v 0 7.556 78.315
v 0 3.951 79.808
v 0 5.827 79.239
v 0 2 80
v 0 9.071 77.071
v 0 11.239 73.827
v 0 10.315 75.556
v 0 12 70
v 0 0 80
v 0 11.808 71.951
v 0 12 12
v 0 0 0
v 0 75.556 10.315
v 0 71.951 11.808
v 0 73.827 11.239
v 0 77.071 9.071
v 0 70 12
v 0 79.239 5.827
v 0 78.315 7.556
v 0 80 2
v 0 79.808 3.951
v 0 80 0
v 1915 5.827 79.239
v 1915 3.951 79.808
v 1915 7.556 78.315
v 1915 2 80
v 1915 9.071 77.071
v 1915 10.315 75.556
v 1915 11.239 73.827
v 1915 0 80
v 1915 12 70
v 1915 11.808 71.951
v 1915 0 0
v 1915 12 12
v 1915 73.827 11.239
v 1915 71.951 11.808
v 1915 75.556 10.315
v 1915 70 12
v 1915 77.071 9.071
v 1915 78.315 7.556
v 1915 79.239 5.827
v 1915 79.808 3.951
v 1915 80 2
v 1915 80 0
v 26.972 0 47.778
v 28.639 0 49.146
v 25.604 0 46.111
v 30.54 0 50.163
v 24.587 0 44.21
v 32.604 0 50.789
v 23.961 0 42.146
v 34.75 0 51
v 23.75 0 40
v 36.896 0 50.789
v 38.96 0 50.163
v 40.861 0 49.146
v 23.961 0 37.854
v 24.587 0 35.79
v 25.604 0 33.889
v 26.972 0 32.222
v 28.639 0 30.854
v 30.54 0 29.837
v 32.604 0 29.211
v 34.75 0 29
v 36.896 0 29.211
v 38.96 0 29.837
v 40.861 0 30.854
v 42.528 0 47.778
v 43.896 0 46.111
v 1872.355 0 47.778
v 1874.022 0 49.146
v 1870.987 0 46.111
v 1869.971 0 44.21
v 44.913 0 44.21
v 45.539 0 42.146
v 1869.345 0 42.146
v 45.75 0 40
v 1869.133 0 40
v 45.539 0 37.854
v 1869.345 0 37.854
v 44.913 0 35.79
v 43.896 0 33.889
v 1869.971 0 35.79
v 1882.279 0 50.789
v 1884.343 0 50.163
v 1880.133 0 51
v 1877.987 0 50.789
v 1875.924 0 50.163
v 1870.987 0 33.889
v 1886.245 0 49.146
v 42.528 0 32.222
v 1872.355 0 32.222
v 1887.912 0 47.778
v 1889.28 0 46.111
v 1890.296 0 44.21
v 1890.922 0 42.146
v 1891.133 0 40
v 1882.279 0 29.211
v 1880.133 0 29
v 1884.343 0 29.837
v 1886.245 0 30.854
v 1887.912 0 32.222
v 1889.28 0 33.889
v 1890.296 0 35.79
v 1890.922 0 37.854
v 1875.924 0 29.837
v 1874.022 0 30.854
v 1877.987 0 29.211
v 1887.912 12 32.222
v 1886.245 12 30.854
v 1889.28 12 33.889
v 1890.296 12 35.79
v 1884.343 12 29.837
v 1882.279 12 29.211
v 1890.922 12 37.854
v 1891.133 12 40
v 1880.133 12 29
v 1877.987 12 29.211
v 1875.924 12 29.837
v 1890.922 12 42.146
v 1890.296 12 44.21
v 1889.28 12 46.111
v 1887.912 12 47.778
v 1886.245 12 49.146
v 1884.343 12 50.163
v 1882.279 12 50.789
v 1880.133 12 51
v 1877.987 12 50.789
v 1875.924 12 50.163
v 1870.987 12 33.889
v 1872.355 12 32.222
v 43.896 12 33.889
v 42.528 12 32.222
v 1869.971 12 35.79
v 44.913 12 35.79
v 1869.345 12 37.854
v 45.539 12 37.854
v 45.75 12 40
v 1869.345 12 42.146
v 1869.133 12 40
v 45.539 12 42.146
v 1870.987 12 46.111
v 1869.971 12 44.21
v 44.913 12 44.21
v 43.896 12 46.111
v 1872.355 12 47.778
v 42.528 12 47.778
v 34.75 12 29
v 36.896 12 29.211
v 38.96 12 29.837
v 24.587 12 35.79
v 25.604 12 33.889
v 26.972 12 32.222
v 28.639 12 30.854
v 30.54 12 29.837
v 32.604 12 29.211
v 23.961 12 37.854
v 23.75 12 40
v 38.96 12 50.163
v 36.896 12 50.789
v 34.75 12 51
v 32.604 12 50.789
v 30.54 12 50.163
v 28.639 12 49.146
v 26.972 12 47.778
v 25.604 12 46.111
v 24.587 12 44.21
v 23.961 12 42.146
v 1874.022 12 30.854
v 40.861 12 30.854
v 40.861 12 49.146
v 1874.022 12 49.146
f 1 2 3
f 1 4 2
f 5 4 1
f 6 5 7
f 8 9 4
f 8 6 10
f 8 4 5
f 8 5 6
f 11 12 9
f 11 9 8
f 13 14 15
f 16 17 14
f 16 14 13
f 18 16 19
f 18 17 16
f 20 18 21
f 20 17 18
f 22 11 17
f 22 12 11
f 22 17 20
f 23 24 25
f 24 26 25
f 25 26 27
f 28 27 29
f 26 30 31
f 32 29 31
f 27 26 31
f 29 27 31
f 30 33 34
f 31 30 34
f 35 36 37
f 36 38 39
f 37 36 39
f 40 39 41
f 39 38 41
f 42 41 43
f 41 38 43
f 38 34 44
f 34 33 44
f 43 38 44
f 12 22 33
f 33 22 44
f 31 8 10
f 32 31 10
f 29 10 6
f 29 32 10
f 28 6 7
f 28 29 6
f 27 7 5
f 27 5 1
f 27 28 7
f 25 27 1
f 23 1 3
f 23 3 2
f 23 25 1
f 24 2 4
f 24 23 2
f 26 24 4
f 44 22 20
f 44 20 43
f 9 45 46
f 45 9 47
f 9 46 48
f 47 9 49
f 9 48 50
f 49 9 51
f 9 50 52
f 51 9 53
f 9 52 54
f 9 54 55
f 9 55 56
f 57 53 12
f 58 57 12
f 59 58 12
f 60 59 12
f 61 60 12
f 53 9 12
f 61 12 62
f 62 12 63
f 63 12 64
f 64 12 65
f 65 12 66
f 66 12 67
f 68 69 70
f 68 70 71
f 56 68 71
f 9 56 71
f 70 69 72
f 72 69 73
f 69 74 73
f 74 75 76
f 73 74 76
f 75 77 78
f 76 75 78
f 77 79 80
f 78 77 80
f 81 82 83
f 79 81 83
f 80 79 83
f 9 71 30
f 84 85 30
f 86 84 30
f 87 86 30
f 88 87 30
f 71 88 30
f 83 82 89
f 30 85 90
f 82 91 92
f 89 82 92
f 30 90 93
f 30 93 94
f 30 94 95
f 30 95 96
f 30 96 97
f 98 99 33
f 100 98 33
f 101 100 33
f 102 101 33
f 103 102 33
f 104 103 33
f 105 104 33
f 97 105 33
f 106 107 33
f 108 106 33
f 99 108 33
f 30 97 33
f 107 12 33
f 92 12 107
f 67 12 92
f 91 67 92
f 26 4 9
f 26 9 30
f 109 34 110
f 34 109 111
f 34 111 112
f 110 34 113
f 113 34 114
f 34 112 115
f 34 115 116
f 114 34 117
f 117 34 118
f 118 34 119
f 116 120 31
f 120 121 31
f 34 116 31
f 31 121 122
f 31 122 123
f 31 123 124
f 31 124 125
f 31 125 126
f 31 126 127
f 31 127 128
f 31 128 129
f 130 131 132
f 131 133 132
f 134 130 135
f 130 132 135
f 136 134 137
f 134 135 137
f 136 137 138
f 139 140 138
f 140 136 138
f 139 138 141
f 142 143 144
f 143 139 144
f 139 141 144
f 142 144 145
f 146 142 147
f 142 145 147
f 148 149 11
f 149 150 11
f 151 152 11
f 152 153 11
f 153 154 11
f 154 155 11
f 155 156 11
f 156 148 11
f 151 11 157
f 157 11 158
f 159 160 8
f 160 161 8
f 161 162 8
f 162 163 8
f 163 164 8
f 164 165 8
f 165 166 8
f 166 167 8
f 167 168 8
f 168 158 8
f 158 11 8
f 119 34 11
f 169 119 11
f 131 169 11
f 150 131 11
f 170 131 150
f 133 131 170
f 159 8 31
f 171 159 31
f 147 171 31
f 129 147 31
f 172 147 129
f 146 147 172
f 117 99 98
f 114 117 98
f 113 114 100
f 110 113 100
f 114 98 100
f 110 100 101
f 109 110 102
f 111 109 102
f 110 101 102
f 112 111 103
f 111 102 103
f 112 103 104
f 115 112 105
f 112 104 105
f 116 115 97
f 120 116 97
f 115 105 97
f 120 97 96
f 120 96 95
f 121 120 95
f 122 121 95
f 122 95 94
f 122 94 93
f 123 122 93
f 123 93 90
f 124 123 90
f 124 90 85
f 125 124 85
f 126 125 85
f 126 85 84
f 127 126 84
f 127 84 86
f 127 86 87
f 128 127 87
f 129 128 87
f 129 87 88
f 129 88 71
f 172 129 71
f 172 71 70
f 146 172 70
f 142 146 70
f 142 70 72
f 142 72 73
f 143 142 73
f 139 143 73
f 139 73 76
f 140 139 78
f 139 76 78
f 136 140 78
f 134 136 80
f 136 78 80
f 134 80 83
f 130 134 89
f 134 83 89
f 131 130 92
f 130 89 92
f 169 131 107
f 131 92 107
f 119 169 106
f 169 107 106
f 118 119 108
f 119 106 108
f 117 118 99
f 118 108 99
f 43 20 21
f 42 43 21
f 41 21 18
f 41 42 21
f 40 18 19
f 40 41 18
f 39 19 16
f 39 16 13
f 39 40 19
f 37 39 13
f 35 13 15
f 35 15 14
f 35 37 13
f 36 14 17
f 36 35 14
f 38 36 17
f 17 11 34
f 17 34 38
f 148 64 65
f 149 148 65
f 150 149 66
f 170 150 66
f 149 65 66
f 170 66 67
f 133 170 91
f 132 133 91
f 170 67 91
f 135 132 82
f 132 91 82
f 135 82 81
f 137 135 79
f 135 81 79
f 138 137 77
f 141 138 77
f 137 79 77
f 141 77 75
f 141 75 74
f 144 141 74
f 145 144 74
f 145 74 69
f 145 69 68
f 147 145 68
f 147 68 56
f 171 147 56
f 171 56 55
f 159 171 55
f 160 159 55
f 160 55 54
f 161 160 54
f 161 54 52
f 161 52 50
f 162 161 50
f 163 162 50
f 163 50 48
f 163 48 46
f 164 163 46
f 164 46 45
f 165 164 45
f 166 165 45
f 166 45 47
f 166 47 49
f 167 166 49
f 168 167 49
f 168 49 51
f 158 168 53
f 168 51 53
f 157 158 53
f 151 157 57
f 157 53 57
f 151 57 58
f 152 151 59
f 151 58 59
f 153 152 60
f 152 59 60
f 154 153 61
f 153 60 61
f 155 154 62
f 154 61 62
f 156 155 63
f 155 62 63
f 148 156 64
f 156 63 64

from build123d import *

# Parameters (mm, degrees)
SKETCH_1_W             = 1915
SKETCH_1_H             = 80
EXTRUDE_1_DEPTH        = 80
SKETCH_3_W             = 68
SKETCH_3_H             = 68
CUT_EXTRUDE_2_DEPTH    = 1919.339125389
FILLET_1_R             = 10
SKETCH_7_R             = 11
CUT_EXTRUDE_5_DEPTH    = 1919.339125389
PATTERN_LINEAR_3_COUNT = 2
PATTERN_LINEAR_3_PITCH = 1845.383428992


with BuildPart() as part:
    # 草图1 → 拉伸1 (new body)
    with BuildSketch(Plane.XY):
        with Locations((957.5, 40)):
            Rectangle(SKETCH_1_W, SKETCH_1_H)
    extrude(amount=EXTRUDE_1_DEPTH)

    # 草图3 → 拉伸2 (cut, through all)
    with BuildSketch(Plane.ZY):
        with Locations((46, 46)):
            Rectangle(SKETCH_3_W, SKETCH_3_H)
    extrude(amount=-CUT_EXTRUDE_2_DEPTH, mode=Mode.SUBTRACT)

    # 圆角1
    fillet_1_edges = [part.edges().sort_by_distance(p)[0] for p in [
        (957.5, 80, 12),
        (957.5, 12, 80),
    ]]
    fillet(fillet_1_edges, radius=FILLET_1_R)

    # 草图7 → 拉伸5 (cut, through all)
    with BuildSketch(Plane.XZ):
        with Locations(Location((34.75, 40, 0), (0, 0, 270))):
            Circle(SKETCH_7_R)
    cut_extrude_5 = extrude(amount=-CUT_EXTRUDE_5_DEPTH, mode=Mode.SUBTRACT)

    # 阵列(线性)3: 拉伸5 ×2
    with Locations(*[(i * PATTERN_LINEAR_3_PITCH, 0, 0) for i in range(1, PATTERN_LINEAR_3_COUNT)]):
        add(cut_extrude_5, mode=Mode.SUBTRACT)


solid = part.part
